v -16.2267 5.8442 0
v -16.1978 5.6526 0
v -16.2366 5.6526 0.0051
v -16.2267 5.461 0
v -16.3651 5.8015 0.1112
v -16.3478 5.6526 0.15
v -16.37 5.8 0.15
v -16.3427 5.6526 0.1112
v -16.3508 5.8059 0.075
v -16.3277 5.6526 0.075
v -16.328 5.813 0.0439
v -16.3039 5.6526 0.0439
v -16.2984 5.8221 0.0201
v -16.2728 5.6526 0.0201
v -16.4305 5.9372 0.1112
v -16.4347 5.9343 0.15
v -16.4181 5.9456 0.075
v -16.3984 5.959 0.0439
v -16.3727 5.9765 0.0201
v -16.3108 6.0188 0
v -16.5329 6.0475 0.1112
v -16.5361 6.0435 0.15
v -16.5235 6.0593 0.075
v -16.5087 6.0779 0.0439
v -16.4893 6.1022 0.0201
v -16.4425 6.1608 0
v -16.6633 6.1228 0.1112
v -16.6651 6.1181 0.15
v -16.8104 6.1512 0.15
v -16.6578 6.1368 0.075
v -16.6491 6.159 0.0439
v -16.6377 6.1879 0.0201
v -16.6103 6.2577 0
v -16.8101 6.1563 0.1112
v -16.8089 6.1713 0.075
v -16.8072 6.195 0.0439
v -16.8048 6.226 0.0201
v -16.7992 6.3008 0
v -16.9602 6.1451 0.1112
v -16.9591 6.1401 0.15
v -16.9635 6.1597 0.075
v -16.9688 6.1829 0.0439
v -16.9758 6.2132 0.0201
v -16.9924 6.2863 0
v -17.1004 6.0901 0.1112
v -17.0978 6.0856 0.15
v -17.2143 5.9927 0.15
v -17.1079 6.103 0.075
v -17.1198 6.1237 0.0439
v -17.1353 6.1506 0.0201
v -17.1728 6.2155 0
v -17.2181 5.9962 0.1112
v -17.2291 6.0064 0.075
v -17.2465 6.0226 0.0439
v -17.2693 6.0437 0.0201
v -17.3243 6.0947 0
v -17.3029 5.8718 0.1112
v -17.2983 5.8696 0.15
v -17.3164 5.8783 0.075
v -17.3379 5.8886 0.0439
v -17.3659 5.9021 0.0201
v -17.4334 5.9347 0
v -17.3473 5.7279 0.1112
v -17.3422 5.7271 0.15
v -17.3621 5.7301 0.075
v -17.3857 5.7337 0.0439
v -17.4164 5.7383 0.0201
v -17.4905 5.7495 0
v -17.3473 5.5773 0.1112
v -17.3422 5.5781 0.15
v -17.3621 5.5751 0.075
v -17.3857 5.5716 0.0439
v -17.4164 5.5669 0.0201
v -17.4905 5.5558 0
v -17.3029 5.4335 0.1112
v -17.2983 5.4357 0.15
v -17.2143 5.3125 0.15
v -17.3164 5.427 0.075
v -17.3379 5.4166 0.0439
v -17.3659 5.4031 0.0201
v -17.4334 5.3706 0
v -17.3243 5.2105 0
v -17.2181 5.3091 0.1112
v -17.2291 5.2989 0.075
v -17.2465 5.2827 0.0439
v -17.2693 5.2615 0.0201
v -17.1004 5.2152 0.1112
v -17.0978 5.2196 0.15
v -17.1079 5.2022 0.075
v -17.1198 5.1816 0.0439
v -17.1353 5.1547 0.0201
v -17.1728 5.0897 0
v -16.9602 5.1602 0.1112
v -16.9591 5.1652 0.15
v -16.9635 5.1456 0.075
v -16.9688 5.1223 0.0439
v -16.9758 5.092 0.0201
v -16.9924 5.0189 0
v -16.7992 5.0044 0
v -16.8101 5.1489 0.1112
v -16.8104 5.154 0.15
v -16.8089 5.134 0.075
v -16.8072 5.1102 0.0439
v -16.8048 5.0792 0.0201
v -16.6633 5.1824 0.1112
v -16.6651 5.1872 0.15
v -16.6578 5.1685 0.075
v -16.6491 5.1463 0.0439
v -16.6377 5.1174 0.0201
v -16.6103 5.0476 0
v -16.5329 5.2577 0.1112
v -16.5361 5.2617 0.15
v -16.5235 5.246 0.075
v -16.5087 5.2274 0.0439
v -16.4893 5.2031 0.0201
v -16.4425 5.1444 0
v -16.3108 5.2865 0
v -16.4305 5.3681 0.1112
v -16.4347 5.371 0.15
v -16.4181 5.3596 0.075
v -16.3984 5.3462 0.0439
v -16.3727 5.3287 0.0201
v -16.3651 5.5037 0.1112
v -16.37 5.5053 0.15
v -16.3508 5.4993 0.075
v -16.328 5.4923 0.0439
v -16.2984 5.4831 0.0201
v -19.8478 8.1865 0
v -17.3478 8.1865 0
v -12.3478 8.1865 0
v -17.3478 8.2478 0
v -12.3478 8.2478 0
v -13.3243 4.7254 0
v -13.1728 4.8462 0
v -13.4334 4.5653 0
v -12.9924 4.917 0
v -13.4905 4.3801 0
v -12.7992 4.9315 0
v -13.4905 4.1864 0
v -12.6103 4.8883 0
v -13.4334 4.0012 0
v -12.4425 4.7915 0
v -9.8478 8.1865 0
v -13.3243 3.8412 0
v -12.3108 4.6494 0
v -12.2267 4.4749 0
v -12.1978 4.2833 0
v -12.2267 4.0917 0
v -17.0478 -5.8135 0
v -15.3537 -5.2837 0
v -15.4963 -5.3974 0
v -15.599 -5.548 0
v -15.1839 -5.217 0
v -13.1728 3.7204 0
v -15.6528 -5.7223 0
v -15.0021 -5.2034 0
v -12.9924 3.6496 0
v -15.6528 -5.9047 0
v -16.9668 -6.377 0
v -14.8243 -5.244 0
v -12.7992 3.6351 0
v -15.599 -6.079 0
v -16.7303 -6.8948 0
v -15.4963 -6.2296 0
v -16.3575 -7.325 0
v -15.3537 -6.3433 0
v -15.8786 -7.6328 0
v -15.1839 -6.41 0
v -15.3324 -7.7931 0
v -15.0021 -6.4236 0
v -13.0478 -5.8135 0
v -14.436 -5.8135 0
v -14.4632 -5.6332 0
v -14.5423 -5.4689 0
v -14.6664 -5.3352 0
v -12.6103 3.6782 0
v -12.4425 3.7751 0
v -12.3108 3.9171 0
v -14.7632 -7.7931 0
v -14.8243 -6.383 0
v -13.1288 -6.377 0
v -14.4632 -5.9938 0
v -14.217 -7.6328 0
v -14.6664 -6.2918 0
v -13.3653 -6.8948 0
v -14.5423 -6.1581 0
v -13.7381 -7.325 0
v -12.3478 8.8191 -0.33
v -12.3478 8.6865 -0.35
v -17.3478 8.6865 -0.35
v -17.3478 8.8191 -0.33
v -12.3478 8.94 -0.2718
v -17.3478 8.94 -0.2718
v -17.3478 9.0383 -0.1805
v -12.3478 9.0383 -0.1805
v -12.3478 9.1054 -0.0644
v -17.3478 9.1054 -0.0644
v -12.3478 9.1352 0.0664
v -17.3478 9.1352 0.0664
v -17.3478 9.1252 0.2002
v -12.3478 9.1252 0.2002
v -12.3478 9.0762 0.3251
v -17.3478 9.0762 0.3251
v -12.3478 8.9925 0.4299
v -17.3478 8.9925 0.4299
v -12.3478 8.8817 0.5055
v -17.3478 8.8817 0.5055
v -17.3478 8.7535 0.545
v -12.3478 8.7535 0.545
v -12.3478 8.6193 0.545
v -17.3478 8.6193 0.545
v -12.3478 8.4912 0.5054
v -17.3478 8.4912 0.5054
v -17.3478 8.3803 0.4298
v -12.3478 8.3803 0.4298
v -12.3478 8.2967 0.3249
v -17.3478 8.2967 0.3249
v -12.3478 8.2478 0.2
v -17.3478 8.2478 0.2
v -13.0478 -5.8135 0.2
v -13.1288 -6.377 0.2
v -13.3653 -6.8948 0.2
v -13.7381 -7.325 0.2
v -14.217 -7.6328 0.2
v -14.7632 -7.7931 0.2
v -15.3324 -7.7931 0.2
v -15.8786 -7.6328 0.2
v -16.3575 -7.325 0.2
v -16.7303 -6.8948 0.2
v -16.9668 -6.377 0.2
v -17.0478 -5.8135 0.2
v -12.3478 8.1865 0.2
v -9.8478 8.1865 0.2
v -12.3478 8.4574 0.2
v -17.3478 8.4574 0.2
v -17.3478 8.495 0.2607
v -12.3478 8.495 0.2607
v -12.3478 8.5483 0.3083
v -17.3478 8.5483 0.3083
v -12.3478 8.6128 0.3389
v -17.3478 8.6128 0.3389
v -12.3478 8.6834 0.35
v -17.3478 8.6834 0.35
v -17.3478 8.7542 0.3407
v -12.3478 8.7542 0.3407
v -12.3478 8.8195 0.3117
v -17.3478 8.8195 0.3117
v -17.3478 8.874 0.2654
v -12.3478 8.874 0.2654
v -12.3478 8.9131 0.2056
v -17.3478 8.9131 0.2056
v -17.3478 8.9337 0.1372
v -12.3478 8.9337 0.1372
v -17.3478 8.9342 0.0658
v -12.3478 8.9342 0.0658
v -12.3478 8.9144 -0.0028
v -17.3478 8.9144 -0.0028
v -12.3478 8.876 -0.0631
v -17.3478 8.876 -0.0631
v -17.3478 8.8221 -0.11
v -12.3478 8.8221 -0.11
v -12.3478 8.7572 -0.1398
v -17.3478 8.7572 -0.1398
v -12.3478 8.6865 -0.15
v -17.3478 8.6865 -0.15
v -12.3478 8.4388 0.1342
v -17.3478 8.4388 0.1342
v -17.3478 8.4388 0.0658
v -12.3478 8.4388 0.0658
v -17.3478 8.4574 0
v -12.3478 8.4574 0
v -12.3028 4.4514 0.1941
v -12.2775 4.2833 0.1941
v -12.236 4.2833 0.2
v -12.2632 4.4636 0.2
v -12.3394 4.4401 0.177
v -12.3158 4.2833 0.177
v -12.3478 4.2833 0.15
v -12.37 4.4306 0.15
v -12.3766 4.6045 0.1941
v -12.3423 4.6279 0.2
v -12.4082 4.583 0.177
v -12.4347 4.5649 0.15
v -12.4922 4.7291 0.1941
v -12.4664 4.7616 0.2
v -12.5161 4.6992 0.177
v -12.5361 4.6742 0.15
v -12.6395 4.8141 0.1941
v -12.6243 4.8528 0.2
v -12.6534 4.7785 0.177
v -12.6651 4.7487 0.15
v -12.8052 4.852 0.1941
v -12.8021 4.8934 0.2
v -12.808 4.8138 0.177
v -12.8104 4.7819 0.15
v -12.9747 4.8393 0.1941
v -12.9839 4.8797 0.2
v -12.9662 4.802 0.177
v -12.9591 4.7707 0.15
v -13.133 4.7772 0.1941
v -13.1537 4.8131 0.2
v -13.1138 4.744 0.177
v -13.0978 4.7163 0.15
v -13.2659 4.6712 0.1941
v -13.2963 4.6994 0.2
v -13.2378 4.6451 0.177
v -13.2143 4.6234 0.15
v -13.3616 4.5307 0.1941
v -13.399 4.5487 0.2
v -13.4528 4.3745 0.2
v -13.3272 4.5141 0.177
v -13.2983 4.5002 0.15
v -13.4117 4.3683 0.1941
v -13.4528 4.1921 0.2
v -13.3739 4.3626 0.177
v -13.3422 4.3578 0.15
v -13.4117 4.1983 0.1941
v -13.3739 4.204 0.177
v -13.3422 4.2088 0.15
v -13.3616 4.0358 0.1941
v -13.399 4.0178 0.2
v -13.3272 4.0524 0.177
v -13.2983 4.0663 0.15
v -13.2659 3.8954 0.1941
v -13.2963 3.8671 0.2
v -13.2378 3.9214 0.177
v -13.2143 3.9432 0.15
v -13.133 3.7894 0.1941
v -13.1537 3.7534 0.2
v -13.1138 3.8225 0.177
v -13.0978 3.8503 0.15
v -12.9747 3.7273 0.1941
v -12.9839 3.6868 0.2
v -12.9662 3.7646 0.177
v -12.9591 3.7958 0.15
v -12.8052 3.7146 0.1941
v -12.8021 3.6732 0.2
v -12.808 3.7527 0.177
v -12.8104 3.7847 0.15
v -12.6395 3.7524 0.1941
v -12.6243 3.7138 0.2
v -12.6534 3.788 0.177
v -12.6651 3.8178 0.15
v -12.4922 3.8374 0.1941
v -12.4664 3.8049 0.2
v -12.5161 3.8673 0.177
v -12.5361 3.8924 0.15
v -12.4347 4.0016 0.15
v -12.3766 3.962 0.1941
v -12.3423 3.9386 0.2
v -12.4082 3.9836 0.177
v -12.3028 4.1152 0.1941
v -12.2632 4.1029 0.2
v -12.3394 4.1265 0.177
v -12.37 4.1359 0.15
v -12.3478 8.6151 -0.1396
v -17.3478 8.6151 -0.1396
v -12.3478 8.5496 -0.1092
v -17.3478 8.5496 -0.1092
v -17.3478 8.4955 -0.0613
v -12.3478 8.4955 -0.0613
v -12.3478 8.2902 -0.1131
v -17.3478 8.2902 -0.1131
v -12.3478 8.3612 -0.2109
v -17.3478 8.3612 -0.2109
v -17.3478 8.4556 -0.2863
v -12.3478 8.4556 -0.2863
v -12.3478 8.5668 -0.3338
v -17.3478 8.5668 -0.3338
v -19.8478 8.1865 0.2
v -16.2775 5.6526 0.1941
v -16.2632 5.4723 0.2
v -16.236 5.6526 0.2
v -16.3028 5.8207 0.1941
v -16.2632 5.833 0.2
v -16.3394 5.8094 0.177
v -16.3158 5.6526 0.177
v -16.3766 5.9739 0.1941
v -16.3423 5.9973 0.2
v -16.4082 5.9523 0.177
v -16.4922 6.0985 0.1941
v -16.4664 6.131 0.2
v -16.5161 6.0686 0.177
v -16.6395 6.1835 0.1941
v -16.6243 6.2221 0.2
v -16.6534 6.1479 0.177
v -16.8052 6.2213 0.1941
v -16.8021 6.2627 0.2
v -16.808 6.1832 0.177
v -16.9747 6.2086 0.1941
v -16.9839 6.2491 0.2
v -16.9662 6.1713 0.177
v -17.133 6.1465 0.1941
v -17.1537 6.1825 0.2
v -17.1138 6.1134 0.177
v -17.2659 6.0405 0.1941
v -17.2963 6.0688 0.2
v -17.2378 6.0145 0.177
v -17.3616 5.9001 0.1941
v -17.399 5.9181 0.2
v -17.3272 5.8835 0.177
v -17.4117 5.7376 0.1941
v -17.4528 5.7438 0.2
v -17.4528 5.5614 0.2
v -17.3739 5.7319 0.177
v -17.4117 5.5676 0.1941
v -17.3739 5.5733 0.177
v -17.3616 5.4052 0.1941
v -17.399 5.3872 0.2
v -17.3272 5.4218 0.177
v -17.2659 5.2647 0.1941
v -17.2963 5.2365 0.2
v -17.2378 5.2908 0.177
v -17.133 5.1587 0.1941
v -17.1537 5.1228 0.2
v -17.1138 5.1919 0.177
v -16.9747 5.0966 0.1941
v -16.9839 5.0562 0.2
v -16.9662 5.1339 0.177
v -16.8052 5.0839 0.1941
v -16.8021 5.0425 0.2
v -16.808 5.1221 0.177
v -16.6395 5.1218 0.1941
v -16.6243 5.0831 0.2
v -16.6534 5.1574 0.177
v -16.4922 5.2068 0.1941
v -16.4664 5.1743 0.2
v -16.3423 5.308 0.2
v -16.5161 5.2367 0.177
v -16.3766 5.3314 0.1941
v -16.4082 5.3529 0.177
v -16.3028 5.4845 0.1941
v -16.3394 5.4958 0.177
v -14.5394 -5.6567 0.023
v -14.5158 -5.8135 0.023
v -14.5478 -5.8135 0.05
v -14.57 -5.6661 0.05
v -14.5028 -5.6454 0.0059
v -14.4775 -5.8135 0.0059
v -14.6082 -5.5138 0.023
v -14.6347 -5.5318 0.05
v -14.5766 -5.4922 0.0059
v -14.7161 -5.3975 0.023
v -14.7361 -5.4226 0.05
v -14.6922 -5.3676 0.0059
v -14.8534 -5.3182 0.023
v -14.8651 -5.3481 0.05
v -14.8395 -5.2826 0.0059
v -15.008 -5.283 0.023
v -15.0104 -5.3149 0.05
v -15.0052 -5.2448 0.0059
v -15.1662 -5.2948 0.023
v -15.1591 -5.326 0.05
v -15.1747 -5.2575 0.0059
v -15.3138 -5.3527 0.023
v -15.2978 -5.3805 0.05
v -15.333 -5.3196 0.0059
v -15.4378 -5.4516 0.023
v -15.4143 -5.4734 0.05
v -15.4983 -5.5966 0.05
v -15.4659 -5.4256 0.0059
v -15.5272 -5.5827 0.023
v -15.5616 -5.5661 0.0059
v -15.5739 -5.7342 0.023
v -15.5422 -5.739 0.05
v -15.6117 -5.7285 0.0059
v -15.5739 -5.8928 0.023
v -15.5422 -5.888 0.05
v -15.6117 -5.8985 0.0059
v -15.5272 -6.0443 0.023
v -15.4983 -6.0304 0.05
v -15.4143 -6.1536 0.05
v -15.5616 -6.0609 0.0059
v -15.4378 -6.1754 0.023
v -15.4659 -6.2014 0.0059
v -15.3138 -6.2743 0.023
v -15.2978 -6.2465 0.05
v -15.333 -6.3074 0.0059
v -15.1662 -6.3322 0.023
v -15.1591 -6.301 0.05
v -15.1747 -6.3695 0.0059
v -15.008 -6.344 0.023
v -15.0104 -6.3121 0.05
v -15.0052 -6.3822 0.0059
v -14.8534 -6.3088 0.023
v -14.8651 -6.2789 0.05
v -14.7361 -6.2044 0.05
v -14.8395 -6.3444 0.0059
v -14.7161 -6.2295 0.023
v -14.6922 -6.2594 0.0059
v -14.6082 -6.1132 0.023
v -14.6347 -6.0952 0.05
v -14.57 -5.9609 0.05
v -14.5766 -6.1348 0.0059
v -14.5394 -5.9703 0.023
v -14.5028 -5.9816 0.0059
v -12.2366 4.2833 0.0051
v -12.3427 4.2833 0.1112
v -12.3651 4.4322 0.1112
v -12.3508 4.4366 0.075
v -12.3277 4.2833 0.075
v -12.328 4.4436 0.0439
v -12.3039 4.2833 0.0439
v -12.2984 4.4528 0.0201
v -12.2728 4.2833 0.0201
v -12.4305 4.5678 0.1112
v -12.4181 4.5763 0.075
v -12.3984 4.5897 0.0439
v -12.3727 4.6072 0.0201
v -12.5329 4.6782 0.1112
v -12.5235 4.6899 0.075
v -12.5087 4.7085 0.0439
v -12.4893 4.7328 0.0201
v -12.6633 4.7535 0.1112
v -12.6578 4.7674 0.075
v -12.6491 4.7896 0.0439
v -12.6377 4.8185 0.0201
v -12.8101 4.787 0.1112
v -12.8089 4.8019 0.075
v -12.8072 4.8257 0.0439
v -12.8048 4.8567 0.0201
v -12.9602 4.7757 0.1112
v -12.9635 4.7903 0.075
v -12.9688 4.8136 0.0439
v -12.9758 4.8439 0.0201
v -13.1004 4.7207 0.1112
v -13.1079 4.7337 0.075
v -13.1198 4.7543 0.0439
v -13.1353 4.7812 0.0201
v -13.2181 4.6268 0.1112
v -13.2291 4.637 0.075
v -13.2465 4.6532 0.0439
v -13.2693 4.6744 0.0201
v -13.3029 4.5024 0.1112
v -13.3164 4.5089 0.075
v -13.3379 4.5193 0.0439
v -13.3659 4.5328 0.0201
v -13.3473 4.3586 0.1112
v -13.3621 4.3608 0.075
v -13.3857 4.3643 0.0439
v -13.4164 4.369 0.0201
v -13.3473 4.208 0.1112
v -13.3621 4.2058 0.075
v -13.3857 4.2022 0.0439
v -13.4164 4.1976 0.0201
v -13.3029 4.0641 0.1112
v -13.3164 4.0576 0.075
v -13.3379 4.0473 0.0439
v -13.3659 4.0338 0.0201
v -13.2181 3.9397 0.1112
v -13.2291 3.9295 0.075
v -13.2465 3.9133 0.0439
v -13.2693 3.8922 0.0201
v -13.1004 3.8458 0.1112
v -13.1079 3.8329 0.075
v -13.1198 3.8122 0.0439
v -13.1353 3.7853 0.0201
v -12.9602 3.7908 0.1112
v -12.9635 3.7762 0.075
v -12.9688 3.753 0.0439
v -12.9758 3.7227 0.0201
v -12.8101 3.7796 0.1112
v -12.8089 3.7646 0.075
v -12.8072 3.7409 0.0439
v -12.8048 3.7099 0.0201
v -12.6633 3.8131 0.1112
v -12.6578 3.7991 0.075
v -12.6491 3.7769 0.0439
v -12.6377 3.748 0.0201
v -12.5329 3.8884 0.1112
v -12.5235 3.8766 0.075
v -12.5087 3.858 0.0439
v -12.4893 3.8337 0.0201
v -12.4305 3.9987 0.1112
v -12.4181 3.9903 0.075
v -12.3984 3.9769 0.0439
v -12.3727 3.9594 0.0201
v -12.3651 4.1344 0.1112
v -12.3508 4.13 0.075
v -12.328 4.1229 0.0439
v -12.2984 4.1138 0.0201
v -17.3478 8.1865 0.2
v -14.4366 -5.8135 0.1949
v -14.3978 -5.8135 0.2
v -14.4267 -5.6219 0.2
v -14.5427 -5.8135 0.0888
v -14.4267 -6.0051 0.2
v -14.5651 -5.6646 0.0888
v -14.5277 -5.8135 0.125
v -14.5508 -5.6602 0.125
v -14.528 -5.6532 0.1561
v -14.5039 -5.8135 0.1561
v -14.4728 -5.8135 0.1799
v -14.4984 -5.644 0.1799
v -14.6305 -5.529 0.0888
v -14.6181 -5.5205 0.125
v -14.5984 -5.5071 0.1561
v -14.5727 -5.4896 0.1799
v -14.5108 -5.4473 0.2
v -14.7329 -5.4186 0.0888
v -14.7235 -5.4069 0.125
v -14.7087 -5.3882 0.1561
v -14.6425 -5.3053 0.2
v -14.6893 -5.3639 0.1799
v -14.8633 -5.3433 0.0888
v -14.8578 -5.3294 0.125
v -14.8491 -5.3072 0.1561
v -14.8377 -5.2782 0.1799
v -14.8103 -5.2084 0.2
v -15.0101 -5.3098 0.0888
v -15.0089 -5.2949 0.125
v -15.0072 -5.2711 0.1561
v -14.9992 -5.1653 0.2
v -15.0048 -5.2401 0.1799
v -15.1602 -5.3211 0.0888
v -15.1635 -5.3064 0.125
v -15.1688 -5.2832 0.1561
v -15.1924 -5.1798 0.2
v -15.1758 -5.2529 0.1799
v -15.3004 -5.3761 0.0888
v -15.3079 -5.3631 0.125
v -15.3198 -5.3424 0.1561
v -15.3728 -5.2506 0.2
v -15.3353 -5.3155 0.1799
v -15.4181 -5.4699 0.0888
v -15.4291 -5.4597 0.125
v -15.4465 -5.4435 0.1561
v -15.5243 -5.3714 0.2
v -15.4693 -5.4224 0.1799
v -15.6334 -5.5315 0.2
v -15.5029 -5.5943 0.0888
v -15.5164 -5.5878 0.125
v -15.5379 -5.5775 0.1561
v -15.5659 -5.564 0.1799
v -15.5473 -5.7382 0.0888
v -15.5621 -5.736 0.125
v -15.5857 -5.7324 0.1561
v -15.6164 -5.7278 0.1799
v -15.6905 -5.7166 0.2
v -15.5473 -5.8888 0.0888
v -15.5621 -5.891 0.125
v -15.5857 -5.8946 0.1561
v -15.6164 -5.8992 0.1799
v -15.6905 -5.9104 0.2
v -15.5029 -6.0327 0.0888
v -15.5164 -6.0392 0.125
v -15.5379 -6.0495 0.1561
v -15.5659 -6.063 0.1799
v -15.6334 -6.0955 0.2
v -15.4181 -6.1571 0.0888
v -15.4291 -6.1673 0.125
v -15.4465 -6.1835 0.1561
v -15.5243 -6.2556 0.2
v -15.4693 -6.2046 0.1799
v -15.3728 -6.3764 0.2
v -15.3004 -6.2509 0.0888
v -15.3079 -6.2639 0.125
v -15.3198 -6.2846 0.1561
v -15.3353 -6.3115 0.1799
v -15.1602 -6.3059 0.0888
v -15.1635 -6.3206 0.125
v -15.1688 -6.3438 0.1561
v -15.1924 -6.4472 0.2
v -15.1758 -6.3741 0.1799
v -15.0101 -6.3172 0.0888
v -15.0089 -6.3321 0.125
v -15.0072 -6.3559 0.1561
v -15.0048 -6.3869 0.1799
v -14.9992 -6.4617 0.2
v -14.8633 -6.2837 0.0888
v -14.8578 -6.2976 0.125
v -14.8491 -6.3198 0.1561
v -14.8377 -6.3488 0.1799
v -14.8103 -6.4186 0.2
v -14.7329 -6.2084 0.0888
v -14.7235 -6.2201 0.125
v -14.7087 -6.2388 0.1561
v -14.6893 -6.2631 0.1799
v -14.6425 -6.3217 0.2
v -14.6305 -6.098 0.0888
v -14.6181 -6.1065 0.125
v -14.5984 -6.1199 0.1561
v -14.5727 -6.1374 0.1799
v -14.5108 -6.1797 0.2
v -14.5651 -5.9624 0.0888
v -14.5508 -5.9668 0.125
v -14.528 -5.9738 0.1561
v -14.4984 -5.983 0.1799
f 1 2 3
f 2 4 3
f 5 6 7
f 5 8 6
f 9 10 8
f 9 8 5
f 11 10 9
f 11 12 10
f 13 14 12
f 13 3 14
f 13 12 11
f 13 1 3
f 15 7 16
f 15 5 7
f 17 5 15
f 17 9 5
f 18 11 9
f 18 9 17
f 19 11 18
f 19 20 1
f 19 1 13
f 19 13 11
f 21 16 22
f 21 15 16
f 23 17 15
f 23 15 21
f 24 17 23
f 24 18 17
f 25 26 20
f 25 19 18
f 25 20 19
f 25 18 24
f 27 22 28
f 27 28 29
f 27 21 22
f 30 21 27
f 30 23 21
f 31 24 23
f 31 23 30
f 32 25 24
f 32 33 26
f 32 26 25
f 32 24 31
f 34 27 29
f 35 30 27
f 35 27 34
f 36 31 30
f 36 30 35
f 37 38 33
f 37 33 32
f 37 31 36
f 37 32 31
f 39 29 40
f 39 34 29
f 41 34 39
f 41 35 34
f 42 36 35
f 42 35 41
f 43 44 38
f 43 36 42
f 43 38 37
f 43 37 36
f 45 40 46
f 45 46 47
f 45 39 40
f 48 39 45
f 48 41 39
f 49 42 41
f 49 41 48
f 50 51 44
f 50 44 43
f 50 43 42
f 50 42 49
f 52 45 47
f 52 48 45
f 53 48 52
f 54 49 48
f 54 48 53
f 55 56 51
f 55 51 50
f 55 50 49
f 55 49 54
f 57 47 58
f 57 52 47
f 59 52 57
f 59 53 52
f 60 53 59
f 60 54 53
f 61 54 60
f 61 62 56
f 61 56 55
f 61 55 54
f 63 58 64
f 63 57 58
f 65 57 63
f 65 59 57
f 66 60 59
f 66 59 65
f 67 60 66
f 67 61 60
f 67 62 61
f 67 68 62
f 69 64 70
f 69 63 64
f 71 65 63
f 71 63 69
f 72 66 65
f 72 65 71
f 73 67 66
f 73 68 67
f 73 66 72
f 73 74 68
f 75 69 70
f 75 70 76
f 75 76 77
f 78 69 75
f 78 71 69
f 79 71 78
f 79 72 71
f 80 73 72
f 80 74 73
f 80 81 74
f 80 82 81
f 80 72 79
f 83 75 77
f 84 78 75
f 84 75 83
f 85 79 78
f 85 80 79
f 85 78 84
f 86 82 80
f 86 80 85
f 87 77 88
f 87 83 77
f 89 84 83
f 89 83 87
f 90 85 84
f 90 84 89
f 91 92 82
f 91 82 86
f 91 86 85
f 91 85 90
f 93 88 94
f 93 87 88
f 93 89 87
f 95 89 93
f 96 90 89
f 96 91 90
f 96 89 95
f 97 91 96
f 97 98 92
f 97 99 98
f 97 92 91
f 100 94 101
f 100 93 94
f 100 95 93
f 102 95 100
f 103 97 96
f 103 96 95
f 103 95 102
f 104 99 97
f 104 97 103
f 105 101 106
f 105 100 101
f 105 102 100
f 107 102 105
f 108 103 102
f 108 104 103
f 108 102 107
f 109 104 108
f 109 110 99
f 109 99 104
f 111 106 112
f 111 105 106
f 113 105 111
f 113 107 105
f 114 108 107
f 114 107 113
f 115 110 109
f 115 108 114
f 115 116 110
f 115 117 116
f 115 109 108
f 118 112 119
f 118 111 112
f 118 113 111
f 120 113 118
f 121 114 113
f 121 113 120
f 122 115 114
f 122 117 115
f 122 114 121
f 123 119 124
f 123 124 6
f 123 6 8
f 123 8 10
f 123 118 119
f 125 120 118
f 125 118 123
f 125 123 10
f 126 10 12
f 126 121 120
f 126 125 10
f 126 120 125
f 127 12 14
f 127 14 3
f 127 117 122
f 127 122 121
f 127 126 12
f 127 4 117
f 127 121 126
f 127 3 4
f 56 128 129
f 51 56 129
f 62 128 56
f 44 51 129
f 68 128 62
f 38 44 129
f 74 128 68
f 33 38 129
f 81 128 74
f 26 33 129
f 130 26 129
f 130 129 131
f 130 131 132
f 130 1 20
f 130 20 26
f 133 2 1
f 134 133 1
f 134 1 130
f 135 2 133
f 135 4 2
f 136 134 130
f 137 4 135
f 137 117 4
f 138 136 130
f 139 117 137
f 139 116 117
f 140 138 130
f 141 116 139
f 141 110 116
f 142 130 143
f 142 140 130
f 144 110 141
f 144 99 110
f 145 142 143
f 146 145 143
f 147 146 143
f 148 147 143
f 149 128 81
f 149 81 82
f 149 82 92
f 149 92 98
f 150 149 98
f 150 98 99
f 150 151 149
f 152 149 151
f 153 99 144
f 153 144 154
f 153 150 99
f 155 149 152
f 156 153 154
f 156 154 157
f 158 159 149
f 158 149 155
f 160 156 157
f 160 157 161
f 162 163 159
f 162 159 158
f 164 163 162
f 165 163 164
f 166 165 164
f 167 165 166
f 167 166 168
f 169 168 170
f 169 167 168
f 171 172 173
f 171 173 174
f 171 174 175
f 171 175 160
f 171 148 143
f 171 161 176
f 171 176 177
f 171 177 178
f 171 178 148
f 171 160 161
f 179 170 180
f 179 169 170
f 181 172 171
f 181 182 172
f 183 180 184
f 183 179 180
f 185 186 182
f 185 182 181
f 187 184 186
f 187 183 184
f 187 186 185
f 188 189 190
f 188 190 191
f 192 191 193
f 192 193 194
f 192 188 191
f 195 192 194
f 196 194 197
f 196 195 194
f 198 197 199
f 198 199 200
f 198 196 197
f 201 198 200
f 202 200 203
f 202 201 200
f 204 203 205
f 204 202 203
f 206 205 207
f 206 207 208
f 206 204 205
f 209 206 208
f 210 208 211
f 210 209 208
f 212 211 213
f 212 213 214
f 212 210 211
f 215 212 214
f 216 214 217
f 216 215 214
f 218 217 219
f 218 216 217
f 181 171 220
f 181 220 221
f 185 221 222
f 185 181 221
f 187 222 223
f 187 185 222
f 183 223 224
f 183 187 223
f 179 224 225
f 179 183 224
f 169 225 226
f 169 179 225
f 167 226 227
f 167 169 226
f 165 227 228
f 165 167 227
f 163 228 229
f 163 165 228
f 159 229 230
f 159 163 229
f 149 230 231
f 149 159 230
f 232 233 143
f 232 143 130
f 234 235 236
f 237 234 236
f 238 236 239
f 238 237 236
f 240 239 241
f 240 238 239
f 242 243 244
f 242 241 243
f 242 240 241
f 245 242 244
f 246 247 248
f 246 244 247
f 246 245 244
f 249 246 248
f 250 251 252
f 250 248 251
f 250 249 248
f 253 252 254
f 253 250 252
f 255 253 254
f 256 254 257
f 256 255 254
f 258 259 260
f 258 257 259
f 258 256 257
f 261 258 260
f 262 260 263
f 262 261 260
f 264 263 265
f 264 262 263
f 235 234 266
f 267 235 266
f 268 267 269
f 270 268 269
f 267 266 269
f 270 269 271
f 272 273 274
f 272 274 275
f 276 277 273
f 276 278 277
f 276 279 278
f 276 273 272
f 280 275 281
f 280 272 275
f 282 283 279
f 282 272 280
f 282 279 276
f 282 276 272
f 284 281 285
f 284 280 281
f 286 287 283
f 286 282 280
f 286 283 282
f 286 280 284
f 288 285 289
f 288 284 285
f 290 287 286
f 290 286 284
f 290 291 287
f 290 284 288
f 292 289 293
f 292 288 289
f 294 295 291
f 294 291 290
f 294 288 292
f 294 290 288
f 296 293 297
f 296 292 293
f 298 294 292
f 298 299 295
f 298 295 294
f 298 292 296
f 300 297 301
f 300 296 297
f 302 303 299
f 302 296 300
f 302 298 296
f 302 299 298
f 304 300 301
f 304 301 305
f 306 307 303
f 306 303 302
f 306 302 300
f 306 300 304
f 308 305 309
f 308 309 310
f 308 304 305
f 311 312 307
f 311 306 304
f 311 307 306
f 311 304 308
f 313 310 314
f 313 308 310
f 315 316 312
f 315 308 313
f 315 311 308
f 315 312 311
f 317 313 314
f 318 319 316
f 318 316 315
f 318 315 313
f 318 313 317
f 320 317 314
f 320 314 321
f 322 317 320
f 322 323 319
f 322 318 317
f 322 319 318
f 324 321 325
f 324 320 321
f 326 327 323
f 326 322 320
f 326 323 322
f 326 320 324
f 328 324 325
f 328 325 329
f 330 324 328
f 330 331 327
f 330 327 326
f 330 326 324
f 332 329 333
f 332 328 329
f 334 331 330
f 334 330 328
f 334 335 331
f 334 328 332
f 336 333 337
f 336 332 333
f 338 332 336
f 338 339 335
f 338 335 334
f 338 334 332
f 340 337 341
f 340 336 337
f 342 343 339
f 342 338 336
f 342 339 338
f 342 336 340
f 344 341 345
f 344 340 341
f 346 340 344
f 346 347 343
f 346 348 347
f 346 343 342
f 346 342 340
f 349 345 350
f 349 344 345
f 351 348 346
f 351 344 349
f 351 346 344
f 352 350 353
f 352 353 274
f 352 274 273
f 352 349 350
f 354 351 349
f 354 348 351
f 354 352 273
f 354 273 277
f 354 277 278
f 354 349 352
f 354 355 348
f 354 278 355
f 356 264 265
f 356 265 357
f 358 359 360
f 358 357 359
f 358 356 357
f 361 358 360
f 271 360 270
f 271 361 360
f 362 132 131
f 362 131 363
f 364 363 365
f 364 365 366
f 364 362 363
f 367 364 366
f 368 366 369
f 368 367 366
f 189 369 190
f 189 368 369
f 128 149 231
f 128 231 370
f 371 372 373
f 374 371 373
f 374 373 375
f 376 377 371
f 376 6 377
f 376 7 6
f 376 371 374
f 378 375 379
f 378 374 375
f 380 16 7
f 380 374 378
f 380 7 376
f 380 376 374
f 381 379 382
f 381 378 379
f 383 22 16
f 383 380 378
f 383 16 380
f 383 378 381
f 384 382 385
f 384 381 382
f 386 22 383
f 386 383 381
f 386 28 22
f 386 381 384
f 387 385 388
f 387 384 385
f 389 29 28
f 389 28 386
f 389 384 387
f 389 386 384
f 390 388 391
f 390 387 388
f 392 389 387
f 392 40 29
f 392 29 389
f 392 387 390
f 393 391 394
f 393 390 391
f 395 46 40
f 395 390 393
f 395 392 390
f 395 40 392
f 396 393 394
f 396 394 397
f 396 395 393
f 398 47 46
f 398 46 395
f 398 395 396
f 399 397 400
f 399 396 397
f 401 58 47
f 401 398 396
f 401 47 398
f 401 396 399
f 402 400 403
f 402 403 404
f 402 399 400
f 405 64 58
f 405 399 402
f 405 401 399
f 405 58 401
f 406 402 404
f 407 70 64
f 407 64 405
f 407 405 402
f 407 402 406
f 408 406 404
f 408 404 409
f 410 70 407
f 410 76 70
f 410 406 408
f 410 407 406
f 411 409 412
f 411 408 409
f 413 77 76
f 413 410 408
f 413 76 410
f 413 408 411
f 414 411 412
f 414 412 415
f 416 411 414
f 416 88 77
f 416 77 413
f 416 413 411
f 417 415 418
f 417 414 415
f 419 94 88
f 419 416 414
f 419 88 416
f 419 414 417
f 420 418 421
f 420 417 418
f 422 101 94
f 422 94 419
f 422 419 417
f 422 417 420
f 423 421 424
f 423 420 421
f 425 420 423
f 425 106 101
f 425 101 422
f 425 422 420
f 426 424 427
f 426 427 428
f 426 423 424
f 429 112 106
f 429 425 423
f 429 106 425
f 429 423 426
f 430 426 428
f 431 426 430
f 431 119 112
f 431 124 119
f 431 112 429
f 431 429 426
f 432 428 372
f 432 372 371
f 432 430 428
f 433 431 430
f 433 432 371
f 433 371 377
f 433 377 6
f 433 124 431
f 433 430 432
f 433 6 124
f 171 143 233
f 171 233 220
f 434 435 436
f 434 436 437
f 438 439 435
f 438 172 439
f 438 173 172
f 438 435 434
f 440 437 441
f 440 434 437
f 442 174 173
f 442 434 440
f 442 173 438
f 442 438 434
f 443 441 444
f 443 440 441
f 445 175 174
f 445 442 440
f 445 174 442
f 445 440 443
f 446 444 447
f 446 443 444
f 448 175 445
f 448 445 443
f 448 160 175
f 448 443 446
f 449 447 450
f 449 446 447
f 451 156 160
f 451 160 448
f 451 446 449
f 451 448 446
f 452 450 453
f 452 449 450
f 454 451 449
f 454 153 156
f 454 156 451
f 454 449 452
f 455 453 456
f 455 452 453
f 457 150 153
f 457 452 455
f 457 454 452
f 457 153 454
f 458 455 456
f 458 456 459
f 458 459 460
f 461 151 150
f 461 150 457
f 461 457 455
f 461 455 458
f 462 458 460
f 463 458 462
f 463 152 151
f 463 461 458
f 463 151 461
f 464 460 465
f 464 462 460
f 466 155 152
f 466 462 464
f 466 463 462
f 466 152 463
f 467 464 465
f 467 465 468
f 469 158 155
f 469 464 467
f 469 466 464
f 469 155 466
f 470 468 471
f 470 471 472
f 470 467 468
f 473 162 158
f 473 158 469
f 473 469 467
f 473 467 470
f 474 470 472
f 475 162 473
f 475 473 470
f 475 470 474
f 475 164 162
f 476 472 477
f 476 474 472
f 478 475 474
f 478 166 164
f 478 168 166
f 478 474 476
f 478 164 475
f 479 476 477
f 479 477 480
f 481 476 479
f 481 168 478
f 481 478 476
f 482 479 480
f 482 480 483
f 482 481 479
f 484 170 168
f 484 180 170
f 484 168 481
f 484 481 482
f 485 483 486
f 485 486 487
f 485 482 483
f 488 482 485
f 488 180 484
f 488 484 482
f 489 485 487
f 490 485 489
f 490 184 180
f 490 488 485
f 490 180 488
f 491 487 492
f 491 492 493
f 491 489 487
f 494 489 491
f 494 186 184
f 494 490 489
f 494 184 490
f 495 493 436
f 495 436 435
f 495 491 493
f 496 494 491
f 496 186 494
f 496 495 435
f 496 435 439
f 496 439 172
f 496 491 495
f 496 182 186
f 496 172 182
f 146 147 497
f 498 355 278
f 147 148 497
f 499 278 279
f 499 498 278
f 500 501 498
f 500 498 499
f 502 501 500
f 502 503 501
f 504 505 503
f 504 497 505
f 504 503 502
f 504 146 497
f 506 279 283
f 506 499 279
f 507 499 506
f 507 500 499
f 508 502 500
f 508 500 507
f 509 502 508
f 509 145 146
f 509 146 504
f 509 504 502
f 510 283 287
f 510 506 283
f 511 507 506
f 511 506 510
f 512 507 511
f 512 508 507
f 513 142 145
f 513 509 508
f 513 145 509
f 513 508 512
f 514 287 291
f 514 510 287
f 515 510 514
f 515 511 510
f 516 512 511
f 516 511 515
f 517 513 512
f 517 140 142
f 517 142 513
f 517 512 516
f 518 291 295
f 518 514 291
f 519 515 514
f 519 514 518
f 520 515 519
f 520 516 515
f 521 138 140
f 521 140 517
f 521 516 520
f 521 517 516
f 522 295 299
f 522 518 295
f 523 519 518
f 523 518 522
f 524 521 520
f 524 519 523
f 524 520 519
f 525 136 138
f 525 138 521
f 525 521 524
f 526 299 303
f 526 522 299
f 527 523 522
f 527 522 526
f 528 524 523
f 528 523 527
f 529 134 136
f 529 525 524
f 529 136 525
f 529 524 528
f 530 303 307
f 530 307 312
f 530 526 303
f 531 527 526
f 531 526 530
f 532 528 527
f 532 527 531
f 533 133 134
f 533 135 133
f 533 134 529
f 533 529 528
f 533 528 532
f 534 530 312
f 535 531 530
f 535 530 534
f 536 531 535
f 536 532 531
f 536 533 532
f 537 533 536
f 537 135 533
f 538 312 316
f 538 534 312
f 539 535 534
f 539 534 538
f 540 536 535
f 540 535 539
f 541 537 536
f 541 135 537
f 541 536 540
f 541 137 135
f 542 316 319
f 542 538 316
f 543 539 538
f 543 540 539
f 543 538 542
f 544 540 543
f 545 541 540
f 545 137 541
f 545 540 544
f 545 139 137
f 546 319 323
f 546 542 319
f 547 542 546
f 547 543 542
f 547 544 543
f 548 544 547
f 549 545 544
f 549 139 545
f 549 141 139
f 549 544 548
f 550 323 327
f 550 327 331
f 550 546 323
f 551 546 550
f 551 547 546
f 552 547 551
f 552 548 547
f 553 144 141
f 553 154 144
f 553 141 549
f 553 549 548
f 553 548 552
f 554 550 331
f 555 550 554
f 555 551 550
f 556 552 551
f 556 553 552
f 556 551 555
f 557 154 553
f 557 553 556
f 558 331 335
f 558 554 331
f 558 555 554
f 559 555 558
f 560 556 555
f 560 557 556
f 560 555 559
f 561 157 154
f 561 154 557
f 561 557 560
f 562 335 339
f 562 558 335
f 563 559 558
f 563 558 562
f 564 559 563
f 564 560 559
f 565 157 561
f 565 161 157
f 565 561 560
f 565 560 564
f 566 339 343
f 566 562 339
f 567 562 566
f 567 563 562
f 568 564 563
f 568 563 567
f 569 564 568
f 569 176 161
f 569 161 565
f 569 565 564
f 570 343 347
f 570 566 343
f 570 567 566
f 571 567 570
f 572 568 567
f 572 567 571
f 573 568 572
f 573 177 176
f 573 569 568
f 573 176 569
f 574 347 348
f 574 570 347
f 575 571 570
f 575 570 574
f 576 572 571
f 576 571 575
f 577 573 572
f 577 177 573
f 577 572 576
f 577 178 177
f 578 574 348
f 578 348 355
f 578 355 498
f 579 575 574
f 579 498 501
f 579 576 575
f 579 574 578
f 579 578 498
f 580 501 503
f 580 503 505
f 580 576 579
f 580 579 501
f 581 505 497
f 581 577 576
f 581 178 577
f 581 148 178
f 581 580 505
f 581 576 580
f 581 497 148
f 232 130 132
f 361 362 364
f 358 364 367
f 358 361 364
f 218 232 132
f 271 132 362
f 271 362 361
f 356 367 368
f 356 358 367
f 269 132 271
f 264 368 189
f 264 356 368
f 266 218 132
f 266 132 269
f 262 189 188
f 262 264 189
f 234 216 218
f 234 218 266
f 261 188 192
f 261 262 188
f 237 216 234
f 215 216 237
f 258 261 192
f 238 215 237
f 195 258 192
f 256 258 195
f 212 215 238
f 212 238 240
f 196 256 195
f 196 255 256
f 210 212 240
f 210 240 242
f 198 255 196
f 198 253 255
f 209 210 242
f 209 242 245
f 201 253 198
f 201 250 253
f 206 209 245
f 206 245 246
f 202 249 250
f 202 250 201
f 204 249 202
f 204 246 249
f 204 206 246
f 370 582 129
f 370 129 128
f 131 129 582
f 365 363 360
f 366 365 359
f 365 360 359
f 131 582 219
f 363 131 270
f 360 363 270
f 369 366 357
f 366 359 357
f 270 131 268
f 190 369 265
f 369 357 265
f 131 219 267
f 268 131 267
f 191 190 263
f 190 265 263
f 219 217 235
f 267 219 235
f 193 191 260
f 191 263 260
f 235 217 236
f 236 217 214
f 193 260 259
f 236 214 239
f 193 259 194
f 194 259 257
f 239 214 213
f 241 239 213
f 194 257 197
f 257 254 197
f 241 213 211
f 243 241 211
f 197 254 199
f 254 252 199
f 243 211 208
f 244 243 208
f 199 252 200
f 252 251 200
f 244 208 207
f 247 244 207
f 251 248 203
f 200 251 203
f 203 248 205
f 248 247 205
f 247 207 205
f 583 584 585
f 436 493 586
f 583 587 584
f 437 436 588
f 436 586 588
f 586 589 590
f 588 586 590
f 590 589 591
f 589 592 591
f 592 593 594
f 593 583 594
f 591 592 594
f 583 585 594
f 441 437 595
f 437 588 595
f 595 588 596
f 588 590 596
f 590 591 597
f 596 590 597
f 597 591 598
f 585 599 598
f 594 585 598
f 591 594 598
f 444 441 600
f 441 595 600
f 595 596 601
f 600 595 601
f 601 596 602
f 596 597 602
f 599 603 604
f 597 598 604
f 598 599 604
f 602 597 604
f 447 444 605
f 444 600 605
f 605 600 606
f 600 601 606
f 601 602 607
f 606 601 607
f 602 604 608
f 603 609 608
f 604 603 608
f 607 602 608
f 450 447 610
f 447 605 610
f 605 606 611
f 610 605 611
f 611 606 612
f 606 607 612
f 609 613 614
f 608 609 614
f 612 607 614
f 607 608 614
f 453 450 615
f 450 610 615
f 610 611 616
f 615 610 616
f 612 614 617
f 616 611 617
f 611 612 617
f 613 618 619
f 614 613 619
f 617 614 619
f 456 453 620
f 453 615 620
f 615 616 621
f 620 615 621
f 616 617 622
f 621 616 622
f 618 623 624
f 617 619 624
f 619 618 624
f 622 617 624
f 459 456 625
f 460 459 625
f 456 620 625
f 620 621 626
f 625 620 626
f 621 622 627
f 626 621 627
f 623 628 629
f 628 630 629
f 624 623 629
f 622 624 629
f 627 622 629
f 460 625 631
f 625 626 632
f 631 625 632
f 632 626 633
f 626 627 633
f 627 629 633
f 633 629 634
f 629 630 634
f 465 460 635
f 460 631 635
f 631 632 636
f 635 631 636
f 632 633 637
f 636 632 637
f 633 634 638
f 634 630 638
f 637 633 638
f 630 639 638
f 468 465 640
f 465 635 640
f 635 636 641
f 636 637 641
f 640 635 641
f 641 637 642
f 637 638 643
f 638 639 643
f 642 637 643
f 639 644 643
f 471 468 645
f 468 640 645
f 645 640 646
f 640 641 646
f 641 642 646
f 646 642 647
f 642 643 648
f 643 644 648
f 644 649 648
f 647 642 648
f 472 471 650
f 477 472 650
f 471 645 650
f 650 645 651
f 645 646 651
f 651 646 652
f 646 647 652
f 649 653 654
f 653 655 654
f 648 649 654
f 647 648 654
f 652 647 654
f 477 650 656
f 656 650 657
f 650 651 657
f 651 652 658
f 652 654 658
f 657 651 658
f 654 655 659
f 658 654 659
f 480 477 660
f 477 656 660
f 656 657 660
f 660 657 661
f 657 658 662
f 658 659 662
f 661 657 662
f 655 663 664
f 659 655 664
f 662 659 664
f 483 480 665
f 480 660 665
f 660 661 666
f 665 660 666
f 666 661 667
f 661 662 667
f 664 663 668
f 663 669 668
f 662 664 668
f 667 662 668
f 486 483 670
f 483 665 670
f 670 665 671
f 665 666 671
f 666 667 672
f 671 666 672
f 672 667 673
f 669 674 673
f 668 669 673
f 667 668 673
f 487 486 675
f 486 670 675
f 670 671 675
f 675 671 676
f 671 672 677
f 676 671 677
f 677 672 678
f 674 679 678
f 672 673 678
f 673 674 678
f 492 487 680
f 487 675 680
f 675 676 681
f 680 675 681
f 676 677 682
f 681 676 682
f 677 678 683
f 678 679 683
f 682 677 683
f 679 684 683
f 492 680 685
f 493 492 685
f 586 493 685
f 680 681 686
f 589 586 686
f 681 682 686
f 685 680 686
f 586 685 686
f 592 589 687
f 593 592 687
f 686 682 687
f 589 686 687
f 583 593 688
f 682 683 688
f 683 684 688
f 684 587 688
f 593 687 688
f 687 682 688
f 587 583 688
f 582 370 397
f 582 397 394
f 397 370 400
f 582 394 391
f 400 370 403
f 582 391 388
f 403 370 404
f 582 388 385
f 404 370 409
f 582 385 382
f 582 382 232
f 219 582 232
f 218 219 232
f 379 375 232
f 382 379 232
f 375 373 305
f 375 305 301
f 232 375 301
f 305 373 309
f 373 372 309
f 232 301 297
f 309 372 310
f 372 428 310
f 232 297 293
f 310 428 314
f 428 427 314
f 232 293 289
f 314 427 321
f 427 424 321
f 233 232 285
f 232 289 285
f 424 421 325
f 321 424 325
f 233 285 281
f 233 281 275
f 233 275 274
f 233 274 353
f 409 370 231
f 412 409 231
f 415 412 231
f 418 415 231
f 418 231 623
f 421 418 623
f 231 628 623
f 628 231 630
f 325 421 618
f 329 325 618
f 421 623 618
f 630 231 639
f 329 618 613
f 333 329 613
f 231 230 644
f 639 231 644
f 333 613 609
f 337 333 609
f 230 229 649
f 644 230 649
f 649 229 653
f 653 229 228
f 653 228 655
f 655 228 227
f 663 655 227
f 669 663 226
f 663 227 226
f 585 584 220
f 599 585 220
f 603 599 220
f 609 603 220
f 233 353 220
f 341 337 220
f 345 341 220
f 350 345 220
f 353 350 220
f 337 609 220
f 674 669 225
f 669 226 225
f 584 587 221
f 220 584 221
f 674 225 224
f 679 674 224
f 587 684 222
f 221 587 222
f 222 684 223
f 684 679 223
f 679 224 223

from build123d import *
from build123d.topology import SkipClean

# Parameters (mm, degrees)
ESBO_O1_R                  = 0.5
RESSALTO_EXTRUS_O1_DEPTH   = 0.2
FILETE1_R                  = 0.15
FILETE2_R                  = 0.15
ESBO_O6_W                  = 10
ESBO_O6_H                  = 0.2
RESSALTO_EXTRUS_O2_DEPTH   = 0.5
RESSALTO_EXTRUS_O3_DEPTH   = 10
CORTE_EXTRUS_O1_DEPTH      = 10
CORTE_EXTRUS_O2_DEPTH      = 10
CORTE_EXTRUS_O2_DEPTH_BACK = 10
ESBO_O9_W                  = 2.5
ESBO_O9_H                  = 2


with BuildPart() as part:
    # Esboço1 → Ressalto-extrusão1 (new body)
    with BuildSketch(Plane.XY):
        with BuildLine():
            Line((-19.847807635, 8.186498983), (-9.847807635, 8.186498983))
            Line((-9.847807635, 8.186498983), (-13.047807635, -5.813501017))
            ThreePointArc((-13.047807635, -5.813501017), (-15.047807635, -7.813501017), (-17.047807635, -5.813501017))
            Line((-17.047807635, -5.813501017), (-19.847807635, 8.186498983))
        make_face()
        with Locations((-12.847807635, 4.283271461)):
            Circle(ESBO_O1_R, mode=Mode.SUBTRACT)
        with Locations((-16.847807635, 5.652628285)):
            Circle(ESBO_O1_R, mode=Mode.SUBTRACT)
        with Locations((-15.047807635, -5.813501017)):
            Circle(ESBO_O1_R, mode=Mode.SUBTRACT)
    extrude(amount=RESSALTO_EXTRUS_O1_DEPTH)

    # Filete1
    filete1_edges = [part.edges().sort_by_distance(p)[0] for p in [
        (-17.347807635, 5.652628285, 0),
        (-13.347807635, 4.283271461, 0),
        (-15.547807635, -5.813501017, 0.2),
    ]]
    fillet(filete1_edges, radius=FILETE1_R)

    # Filete2
    # the kernel refuses this fillet: 0.15 mm, written as the material it takes off along each edge
    with BuildSketch(Plane(origin=(-15.047807635, -5.813501017, 0), x_dir=(1, 0, 0), z_dir=(0, -1, 0))) as filete2_piece_1:
        with BuildLine():
            CenterArc((0.611803399, 0.15), FILETE2_R, 221.810314896, 48.189685104)
            Line((0.5, 0.05), (0.497763932, 0.048))
            ThreePointArc((0.497763932, 0.048), (0.497, 0.025), (0.497, 0))
            Line((0.497, 0), (0.5, -0.003))
            Line((0.5, -0.003), (0.611803399, -0.003))
            Line((0.611803399, -0.003), (0.611803399, 0))
        make_face()
    revolve(axis=Axis((-15.047807635, -5.813501017, 0), (0, 0, 1)), mode=Mode.SUBTRACT)
    with BuildSketch(Plane(origin=(-12.847807635, 4.283271461, 0.2), x_dir=(1, 0, 0), z_dir=(0, -1, 0))) as filete2_piece_2:
        with BuildLine():
            CenterArc((0.611803399, -0.15), FILETE2_R, 90, 48.189685104)
            Line((0.611803399, 0), (0.611803399, 0.003))
            Line((0.611803399, 0.003), (0.5, 0.003))
            Line((0.5, 0.003), (0.497, 0))
            ThreePointArc((0.497, 0), (0.497, -0.025), (0.497763932, -0.048))
            Line((0.497763932, -0.048), (0.5, -0.05))
        make_face()
    revolve(axis=Axis((-12.847807635, 4.283271461, 0.2), (0, 0, 1)), mode=Mode.SUBTRACT)
    with BuildSketch(Plane(origin=(-16.847807635, 5.652628285, 0.2), x_dir=(1, 0, 0), z_dir=(0, -1, 0))) as filete2_piece_3:
        with BuildLine():
            CenterArc((0.611803399, -0.15), FILETE2_R, 90, 48.189685104)
            Line((0.5, -0.05), (0.497763932, -0.048))
            ThreePointArc((0.497763932, -0.048), (0.497, -0.025), (0.497, 0))
            Line((0.497, 0), (0.5, 0.003))
            Line((0.5, 0.003), (0.611803399, 0.003))
            Line((0.611803399, 0.003), (0.611803399, 0))
        make_face()
    revolve(axis=Axis((-16.847807635, 5.652628285, 0.2), (0, 0, 1)), mode=Mode.SUBTRACT)

    # Esboço6 → Ressalto-extrusão2 (add)
    with BuildSketch(Plane(origin=(0, 8.186498983, 0), x_dir=(1, 0, 0), z_dir=(0, 1, 0))):
        with Locations((-14.847807635, -0.1)):
            Rectangle(ESBO_O6_W, ESBO_O6_H)
    extrude(amount=RESSALTO_EXTRUS_O2_DEPTH)

    # Esboço7 → Ressalto-extrusão3 (add)
    with BuildSketch(Plane(origin=(-9.847807635, 0, 0), x_dir=(0, 0, -1), z_dir=(1, 0, 0))):
        with BuildLine():
            ThreePointArc((0.35, 8.686498983), (-0.380624304, 9.038280165), (-0.2, 8.247750764))
            Line((-0.2, 8.247750764), (-0.2, 8.457370198))
            ThreePointArc((-0.2, 8.457370198), (-0.236930639, 8.89566399), (0.15, 8.686498983))
            ThreePointArc((0.15, 8.686498983), (0.109165007, 8.549568344), (0, 8.457370198))
            Line((0, 8.457370198), (0, 8.247750764))
            ThreePointArc((0, 8.247750764), (0.251781182, 8.405874679), (0.35, 8.686498983))
        make_face()
        with BuildLine():
            Line((-0.2, 8.457370198), (-0.2, 8.247750764))
            ThreePointArc((-0.2, 8.247750764), (-0.1, 8.236498983), (0, 8.247750764))
            Line((0, 8.247750764), (0, 8.457370198))
            ThreePointArc((0, 8.457370198), (-0.1, 8.436498983), (-0.2, 8.457370198))
        make_face()
    extrude(amount=-RESSALTO_EXTRUS_O3_DEPTH)

    # Esboço8 → Corte-extrusão1 (cut)
    with SkipClean():  # the faces are left unmerged after this step: merging them gives an invalid solid
        with BuildSketch(Plane(origin=(-9.847807635, 0, 0), x_dir=(0, 0, -1), z_dir=(1, 0, 0))):
            with BuildLine():
                ThreePointArc((-0.2, 8.457370198), (-0.1, 8.936498983), (0, 8.457370198))
                Line((0, 8.457370198), (0, 8.686498983))
                Line((0, 8.686498983), (-0.2, 8.686498983))
                Line((-0.2, 8.686498983), (-0.2, 8.457370198))
            make_face()
            with BuildLine():
                Line((0, 8.686498983), (0, 8.457370198))
                ThreePointArc((0, 8.457370198), (0.109165007, 8.549568344), (0.15, 8.686498983))
                ThreePointArc((0.15, 8.686498983), (-0.236930639, 8.89566399), (-0.2, 8.457370198))
                Line((-0.2, 8.457370198), (-0.2, 8.686498983))
                Line((-0.2, 8.686498983), (0, 8.686498983))
            make_face()
            with BuildLine():
                ThreePointArc((-0.2, 8.457370198), (-0.1, 8.436498983), (0, 8.457370198))
                Line((0, 8.457370198), (0, 8.686498983))
                Line((0, 8.686498983), (-0.2, 8.686498983))
                Line((-0.2, 8.686498983), (-0.2, 8.457370198))
            make_face()
        extrude(amount=-CORTE_EXTRUS_O1_DEPTH, mode=Mode.SUBTRACT)

    # Esboço9 → Corte-extrusão2 (cut, two sides: drawn at the far end of the back side and taken through both)
    with BuildSketch(Plane(origin=(0, 0, 0), x_dir=(-1, 0, 0), z_dir=(0, 0, -1)).offset(-CORTE_EXTRUS_O2_DEPTH_BACK)):
        with Locations((11.097807635, 9.186498983)):
            Rectangle(ESBO_O9_W, ESBO_O9_H)
        with Locations((18.597807635, 9.186498983)):
            Rectangle(ESBO_O9_W, ESBO_O9_H)
    extrude(amount=CORTE_EXTRUS_O2_DEPTH + CORTE_EXTRUS_O2_DEPTH_BACK, mode=Mode.SUBTRACT)


solid = part.part
